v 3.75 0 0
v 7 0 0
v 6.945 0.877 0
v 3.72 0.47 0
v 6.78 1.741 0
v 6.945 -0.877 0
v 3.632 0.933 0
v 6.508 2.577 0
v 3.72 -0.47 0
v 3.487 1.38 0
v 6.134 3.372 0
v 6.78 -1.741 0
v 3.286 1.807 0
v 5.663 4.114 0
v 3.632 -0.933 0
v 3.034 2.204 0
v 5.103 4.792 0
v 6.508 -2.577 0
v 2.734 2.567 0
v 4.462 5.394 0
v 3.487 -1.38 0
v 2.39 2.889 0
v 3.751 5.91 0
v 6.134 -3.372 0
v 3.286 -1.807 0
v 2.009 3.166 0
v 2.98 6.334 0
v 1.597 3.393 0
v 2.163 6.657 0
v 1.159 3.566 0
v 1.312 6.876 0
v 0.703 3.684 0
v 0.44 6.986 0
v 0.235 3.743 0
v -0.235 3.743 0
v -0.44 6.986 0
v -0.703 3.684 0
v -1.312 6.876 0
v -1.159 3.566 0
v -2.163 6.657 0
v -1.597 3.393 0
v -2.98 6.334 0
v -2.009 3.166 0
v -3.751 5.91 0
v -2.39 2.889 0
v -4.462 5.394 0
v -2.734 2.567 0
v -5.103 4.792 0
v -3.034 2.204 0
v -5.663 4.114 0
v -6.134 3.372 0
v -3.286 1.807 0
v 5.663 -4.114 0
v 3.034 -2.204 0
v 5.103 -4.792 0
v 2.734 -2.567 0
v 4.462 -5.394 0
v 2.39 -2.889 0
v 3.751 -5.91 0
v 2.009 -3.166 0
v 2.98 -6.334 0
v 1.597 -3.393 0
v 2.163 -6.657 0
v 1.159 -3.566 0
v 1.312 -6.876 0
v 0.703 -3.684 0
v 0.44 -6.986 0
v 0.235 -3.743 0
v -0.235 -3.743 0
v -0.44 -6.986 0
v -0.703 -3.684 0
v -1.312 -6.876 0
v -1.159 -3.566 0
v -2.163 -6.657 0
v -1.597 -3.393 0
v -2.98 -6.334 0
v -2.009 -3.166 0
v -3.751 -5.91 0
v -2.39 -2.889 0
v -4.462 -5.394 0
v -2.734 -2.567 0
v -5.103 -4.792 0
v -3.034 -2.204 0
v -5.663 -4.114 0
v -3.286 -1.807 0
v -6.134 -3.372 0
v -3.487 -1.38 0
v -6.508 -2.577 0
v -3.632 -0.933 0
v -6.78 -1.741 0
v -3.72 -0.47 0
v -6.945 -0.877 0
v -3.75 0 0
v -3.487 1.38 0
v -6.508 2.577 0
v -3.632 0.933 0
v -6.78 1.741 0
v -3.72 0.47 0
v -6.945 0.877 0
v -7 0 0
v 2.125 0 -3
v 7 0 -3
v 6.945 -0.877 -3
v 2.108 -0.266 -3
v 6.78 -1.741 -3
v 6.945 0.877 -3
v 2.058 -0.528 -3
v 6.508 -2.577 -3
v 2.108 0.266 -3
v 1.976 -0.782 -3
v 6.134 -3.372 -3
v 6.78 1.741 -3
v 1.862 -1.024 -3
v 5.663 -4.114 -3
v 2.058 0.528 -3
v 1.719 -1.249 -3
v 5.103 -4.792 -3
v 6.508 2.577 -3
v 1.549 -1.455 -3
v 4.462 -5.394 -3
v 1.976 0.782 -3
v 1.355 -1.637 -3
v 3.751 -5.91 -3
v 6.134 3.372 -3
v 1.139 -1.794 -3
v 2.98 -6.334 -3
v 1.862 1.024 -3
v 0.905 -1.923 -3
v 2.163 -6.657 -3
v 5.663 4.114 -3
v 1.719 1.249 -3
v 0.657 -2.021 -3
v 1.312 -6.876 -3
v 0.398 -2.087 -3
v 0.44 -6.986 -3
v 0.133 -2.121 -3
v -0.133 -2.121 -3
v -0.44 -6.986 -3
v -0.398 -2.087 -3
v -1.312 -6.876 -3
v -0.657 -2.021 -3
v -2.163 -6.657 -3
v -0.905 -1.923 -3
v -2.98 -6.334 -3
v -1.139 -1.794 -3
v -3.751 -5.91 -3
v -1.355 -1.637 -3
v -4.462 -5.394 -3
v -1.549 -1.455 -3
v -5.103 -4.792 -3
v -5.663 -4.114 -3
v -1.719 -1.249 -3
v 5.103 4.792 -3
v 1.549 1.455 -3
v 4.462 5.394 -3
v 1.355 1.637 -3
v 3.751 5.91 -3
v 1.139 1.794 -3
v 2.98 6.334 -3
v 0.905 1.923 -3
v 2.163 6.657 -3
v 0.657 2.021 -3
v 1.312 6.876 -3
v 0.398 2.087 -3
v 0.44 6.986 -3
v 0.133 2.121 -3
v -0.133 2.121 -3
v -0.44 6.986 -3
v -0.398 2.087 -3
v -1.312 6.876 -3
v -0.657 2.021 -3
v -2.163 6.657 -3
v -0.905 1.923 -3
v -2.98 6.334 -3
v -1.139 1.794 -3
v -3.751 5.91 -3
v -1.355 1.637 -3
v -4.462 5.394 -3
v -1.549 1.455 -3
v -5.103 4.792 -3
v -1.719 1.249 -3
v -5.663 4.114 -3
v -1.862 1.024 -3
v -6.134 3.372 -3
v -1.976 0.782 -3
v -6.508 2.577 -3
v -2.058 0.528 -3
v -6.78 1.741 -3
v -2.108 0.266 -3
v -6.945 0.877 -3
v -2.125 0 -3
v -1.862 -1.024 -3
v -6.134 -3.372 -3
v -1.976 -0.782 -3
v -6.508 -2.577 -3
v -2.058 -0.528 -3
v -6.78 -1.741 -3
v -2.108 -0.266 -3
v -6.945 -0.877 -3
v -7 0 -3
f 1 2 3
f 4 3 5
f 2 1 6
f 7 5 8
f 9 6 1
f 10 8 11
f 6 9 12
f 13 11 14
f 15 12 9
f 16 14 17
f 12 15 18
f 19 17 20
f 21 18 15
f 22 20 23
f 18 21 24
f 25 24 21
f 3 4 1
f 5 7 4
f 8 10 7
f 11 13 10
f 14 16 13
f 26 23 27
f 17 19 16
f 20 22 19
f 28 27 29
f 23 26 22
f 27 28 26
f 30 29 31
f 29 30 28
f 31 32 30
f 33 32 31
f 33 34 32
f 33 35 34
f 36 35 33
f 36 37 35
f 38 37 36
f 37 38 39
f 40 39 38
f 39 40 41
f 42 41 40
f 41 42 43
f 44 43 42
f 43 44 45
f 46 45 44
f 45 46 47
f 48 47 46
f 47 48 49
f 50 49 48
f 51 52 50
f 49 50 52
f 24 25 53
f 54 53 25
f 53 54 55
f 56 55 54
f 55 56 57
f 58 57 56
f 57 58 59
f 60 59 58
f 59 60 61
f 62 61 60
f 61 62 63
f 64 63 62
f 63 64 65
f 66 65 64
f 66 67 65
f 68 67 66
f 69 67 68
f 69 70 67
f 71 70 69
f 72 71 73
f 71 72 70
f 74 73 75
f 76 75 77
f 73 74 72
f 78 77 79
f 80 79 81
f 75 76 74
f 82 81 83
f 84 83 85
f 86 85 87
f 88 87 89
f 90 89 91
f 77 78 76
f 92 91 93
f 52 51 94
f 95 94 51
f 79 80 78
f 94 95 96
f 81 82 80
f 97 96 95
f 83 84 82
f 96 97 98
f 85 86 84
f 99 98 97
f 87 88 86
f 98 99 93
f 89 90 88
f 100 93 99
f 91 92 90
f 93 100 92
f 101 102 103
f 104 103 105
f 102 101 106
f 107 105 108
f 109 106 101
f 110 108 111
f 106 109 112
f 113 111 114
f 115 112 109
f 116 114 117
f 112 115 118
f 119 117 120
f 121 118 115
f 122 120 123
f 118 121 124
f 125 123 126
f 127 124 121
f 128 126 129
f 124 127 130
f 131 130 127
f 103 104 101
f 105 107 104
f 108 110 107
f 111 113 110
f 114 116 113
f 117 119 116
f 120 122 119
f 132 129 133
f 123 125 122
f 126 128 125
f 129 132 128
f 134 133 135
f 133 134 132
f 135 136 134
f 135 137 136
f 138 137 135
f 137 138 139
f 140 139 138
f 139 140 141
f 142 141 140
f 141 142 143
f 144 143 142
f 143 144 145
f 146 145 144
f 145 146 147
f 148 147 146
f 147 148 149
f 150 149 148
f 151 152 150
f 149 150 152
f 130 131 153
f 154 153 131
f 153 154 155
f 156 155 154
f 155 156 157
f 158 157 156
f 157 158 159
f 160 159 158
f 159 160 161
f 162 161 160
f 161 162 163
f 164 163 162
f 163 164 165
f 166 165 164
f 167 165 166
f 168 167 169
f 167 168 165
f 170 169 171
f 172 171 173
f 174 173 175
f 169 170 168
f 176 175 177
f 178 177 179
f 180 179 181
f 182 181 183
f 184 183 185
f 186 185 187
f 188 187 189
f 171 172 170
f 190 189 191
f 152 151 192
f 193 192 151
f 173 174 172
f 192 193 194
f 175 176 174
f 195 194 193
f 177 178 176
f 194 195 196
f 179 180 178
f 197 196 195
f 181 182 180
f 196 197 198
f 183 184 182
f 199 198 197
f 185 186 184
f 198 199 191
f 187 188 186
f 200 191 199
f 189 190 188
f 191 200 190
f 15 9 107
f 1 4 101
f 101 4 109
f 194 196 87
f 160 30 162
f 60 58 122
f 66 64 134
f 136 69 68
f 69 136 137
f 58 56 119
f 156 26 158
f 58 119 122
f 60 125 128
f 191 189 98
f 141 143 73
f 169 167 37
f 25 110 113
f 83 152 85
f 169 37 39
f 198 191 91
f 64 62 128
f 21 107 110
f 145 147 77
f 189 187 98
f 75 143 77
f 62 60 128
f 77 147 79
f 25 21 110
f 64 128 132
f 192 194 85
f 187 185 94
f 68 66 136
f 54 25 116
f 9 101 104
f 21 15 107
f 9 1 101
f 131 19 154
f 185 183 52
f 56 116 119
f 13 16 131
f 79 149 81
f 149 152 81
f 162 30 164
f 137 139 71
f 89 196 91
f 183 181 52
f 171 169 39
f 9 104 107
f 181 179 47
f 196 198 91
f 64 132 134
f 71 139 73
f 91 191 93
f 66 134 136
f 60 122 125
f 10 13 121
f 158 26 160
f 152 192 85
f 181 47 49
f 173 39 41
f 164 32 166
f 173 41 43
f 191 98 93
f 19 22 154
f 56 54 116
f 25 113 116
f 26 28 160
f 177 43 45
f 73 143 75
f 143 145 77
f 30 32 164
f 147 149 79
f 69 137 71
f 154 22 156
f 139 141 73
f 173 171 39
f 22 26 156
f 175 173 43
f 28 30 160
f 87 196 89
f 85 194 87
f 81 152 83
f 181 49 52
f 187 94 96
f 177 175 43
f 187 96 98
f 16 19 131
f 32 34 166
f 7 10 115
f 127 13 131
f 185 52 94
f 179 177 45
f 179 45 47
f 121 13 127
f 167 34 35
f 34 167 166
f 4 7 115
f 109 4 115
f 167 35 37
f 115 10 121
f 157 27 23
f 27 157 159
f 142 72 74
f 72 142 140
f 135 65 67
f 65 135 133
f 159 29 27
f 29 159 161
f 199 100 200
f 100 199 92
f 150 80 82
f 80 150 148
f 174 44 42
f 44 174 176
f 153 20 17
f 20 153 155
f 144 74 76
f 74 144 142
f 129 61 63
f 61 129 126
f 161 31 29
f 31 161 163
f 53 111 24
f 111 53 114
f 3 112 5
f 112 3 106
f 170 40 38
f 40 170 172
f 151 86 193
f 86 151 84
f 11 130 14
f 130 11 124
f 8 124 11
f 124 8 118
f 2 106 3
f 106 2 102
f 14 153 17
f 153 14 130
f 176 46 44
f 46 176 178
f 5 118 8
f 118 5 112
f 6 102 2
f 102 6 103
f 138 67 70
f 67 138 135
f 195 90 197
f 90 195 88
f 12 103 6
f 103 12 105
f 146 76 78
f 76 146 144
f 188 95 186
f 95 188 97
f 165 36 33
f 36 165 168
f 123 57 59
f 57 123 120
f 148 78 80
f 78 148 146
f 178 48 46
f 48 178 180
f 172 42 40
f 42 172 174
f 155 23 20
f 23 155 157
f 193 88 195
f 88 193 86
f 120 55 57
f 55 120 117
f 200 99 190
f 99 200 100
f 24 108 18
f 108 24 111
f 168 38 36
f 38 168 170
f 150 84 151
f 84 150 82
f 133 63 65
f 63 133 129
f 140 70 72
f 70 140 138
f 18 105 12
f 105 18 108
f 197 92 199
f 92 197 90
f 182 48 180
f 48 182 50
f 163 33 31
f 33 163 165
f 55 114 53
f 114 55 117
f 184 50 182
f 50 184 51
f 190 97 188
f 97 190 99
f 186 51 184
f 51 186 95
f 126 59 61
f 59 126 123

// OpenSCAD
$fn = 50;


difference() {
	union() {
		translate(v = [0, 0, -3.0000000000]) {
			cylinder(h = 3, r = 7.0000000000);
		}
		cylinder(h = 0, r = 10.0000000000);
	}
	union() {
		translate(v = [0, 0, 0]) {
			rotate(a = [0, 0, 0]) {
				difference() {
					union() {
						#translate(v = [0, 0, -3.0000000000]) {
							cylinder(h = 3, r = 2.0000000000);
						}
						#translate(v = [0, 0, -3]) {
							cylinder(h = 3, r = 7.0000000000, r1 = 2.1250000000, r2 = 3.7500000000);
						}
						#translate(v = [0, 0, -3.0000000000]) {
							cylinder(h = 3, r = 2.1250000000);
						}
						#translate(v = [0, 0, -3.0000000000]) {
							cylinder(h = 3, r = 2.0000000000);
						}
					}
					union();
				}
			}
		}
	}
}
